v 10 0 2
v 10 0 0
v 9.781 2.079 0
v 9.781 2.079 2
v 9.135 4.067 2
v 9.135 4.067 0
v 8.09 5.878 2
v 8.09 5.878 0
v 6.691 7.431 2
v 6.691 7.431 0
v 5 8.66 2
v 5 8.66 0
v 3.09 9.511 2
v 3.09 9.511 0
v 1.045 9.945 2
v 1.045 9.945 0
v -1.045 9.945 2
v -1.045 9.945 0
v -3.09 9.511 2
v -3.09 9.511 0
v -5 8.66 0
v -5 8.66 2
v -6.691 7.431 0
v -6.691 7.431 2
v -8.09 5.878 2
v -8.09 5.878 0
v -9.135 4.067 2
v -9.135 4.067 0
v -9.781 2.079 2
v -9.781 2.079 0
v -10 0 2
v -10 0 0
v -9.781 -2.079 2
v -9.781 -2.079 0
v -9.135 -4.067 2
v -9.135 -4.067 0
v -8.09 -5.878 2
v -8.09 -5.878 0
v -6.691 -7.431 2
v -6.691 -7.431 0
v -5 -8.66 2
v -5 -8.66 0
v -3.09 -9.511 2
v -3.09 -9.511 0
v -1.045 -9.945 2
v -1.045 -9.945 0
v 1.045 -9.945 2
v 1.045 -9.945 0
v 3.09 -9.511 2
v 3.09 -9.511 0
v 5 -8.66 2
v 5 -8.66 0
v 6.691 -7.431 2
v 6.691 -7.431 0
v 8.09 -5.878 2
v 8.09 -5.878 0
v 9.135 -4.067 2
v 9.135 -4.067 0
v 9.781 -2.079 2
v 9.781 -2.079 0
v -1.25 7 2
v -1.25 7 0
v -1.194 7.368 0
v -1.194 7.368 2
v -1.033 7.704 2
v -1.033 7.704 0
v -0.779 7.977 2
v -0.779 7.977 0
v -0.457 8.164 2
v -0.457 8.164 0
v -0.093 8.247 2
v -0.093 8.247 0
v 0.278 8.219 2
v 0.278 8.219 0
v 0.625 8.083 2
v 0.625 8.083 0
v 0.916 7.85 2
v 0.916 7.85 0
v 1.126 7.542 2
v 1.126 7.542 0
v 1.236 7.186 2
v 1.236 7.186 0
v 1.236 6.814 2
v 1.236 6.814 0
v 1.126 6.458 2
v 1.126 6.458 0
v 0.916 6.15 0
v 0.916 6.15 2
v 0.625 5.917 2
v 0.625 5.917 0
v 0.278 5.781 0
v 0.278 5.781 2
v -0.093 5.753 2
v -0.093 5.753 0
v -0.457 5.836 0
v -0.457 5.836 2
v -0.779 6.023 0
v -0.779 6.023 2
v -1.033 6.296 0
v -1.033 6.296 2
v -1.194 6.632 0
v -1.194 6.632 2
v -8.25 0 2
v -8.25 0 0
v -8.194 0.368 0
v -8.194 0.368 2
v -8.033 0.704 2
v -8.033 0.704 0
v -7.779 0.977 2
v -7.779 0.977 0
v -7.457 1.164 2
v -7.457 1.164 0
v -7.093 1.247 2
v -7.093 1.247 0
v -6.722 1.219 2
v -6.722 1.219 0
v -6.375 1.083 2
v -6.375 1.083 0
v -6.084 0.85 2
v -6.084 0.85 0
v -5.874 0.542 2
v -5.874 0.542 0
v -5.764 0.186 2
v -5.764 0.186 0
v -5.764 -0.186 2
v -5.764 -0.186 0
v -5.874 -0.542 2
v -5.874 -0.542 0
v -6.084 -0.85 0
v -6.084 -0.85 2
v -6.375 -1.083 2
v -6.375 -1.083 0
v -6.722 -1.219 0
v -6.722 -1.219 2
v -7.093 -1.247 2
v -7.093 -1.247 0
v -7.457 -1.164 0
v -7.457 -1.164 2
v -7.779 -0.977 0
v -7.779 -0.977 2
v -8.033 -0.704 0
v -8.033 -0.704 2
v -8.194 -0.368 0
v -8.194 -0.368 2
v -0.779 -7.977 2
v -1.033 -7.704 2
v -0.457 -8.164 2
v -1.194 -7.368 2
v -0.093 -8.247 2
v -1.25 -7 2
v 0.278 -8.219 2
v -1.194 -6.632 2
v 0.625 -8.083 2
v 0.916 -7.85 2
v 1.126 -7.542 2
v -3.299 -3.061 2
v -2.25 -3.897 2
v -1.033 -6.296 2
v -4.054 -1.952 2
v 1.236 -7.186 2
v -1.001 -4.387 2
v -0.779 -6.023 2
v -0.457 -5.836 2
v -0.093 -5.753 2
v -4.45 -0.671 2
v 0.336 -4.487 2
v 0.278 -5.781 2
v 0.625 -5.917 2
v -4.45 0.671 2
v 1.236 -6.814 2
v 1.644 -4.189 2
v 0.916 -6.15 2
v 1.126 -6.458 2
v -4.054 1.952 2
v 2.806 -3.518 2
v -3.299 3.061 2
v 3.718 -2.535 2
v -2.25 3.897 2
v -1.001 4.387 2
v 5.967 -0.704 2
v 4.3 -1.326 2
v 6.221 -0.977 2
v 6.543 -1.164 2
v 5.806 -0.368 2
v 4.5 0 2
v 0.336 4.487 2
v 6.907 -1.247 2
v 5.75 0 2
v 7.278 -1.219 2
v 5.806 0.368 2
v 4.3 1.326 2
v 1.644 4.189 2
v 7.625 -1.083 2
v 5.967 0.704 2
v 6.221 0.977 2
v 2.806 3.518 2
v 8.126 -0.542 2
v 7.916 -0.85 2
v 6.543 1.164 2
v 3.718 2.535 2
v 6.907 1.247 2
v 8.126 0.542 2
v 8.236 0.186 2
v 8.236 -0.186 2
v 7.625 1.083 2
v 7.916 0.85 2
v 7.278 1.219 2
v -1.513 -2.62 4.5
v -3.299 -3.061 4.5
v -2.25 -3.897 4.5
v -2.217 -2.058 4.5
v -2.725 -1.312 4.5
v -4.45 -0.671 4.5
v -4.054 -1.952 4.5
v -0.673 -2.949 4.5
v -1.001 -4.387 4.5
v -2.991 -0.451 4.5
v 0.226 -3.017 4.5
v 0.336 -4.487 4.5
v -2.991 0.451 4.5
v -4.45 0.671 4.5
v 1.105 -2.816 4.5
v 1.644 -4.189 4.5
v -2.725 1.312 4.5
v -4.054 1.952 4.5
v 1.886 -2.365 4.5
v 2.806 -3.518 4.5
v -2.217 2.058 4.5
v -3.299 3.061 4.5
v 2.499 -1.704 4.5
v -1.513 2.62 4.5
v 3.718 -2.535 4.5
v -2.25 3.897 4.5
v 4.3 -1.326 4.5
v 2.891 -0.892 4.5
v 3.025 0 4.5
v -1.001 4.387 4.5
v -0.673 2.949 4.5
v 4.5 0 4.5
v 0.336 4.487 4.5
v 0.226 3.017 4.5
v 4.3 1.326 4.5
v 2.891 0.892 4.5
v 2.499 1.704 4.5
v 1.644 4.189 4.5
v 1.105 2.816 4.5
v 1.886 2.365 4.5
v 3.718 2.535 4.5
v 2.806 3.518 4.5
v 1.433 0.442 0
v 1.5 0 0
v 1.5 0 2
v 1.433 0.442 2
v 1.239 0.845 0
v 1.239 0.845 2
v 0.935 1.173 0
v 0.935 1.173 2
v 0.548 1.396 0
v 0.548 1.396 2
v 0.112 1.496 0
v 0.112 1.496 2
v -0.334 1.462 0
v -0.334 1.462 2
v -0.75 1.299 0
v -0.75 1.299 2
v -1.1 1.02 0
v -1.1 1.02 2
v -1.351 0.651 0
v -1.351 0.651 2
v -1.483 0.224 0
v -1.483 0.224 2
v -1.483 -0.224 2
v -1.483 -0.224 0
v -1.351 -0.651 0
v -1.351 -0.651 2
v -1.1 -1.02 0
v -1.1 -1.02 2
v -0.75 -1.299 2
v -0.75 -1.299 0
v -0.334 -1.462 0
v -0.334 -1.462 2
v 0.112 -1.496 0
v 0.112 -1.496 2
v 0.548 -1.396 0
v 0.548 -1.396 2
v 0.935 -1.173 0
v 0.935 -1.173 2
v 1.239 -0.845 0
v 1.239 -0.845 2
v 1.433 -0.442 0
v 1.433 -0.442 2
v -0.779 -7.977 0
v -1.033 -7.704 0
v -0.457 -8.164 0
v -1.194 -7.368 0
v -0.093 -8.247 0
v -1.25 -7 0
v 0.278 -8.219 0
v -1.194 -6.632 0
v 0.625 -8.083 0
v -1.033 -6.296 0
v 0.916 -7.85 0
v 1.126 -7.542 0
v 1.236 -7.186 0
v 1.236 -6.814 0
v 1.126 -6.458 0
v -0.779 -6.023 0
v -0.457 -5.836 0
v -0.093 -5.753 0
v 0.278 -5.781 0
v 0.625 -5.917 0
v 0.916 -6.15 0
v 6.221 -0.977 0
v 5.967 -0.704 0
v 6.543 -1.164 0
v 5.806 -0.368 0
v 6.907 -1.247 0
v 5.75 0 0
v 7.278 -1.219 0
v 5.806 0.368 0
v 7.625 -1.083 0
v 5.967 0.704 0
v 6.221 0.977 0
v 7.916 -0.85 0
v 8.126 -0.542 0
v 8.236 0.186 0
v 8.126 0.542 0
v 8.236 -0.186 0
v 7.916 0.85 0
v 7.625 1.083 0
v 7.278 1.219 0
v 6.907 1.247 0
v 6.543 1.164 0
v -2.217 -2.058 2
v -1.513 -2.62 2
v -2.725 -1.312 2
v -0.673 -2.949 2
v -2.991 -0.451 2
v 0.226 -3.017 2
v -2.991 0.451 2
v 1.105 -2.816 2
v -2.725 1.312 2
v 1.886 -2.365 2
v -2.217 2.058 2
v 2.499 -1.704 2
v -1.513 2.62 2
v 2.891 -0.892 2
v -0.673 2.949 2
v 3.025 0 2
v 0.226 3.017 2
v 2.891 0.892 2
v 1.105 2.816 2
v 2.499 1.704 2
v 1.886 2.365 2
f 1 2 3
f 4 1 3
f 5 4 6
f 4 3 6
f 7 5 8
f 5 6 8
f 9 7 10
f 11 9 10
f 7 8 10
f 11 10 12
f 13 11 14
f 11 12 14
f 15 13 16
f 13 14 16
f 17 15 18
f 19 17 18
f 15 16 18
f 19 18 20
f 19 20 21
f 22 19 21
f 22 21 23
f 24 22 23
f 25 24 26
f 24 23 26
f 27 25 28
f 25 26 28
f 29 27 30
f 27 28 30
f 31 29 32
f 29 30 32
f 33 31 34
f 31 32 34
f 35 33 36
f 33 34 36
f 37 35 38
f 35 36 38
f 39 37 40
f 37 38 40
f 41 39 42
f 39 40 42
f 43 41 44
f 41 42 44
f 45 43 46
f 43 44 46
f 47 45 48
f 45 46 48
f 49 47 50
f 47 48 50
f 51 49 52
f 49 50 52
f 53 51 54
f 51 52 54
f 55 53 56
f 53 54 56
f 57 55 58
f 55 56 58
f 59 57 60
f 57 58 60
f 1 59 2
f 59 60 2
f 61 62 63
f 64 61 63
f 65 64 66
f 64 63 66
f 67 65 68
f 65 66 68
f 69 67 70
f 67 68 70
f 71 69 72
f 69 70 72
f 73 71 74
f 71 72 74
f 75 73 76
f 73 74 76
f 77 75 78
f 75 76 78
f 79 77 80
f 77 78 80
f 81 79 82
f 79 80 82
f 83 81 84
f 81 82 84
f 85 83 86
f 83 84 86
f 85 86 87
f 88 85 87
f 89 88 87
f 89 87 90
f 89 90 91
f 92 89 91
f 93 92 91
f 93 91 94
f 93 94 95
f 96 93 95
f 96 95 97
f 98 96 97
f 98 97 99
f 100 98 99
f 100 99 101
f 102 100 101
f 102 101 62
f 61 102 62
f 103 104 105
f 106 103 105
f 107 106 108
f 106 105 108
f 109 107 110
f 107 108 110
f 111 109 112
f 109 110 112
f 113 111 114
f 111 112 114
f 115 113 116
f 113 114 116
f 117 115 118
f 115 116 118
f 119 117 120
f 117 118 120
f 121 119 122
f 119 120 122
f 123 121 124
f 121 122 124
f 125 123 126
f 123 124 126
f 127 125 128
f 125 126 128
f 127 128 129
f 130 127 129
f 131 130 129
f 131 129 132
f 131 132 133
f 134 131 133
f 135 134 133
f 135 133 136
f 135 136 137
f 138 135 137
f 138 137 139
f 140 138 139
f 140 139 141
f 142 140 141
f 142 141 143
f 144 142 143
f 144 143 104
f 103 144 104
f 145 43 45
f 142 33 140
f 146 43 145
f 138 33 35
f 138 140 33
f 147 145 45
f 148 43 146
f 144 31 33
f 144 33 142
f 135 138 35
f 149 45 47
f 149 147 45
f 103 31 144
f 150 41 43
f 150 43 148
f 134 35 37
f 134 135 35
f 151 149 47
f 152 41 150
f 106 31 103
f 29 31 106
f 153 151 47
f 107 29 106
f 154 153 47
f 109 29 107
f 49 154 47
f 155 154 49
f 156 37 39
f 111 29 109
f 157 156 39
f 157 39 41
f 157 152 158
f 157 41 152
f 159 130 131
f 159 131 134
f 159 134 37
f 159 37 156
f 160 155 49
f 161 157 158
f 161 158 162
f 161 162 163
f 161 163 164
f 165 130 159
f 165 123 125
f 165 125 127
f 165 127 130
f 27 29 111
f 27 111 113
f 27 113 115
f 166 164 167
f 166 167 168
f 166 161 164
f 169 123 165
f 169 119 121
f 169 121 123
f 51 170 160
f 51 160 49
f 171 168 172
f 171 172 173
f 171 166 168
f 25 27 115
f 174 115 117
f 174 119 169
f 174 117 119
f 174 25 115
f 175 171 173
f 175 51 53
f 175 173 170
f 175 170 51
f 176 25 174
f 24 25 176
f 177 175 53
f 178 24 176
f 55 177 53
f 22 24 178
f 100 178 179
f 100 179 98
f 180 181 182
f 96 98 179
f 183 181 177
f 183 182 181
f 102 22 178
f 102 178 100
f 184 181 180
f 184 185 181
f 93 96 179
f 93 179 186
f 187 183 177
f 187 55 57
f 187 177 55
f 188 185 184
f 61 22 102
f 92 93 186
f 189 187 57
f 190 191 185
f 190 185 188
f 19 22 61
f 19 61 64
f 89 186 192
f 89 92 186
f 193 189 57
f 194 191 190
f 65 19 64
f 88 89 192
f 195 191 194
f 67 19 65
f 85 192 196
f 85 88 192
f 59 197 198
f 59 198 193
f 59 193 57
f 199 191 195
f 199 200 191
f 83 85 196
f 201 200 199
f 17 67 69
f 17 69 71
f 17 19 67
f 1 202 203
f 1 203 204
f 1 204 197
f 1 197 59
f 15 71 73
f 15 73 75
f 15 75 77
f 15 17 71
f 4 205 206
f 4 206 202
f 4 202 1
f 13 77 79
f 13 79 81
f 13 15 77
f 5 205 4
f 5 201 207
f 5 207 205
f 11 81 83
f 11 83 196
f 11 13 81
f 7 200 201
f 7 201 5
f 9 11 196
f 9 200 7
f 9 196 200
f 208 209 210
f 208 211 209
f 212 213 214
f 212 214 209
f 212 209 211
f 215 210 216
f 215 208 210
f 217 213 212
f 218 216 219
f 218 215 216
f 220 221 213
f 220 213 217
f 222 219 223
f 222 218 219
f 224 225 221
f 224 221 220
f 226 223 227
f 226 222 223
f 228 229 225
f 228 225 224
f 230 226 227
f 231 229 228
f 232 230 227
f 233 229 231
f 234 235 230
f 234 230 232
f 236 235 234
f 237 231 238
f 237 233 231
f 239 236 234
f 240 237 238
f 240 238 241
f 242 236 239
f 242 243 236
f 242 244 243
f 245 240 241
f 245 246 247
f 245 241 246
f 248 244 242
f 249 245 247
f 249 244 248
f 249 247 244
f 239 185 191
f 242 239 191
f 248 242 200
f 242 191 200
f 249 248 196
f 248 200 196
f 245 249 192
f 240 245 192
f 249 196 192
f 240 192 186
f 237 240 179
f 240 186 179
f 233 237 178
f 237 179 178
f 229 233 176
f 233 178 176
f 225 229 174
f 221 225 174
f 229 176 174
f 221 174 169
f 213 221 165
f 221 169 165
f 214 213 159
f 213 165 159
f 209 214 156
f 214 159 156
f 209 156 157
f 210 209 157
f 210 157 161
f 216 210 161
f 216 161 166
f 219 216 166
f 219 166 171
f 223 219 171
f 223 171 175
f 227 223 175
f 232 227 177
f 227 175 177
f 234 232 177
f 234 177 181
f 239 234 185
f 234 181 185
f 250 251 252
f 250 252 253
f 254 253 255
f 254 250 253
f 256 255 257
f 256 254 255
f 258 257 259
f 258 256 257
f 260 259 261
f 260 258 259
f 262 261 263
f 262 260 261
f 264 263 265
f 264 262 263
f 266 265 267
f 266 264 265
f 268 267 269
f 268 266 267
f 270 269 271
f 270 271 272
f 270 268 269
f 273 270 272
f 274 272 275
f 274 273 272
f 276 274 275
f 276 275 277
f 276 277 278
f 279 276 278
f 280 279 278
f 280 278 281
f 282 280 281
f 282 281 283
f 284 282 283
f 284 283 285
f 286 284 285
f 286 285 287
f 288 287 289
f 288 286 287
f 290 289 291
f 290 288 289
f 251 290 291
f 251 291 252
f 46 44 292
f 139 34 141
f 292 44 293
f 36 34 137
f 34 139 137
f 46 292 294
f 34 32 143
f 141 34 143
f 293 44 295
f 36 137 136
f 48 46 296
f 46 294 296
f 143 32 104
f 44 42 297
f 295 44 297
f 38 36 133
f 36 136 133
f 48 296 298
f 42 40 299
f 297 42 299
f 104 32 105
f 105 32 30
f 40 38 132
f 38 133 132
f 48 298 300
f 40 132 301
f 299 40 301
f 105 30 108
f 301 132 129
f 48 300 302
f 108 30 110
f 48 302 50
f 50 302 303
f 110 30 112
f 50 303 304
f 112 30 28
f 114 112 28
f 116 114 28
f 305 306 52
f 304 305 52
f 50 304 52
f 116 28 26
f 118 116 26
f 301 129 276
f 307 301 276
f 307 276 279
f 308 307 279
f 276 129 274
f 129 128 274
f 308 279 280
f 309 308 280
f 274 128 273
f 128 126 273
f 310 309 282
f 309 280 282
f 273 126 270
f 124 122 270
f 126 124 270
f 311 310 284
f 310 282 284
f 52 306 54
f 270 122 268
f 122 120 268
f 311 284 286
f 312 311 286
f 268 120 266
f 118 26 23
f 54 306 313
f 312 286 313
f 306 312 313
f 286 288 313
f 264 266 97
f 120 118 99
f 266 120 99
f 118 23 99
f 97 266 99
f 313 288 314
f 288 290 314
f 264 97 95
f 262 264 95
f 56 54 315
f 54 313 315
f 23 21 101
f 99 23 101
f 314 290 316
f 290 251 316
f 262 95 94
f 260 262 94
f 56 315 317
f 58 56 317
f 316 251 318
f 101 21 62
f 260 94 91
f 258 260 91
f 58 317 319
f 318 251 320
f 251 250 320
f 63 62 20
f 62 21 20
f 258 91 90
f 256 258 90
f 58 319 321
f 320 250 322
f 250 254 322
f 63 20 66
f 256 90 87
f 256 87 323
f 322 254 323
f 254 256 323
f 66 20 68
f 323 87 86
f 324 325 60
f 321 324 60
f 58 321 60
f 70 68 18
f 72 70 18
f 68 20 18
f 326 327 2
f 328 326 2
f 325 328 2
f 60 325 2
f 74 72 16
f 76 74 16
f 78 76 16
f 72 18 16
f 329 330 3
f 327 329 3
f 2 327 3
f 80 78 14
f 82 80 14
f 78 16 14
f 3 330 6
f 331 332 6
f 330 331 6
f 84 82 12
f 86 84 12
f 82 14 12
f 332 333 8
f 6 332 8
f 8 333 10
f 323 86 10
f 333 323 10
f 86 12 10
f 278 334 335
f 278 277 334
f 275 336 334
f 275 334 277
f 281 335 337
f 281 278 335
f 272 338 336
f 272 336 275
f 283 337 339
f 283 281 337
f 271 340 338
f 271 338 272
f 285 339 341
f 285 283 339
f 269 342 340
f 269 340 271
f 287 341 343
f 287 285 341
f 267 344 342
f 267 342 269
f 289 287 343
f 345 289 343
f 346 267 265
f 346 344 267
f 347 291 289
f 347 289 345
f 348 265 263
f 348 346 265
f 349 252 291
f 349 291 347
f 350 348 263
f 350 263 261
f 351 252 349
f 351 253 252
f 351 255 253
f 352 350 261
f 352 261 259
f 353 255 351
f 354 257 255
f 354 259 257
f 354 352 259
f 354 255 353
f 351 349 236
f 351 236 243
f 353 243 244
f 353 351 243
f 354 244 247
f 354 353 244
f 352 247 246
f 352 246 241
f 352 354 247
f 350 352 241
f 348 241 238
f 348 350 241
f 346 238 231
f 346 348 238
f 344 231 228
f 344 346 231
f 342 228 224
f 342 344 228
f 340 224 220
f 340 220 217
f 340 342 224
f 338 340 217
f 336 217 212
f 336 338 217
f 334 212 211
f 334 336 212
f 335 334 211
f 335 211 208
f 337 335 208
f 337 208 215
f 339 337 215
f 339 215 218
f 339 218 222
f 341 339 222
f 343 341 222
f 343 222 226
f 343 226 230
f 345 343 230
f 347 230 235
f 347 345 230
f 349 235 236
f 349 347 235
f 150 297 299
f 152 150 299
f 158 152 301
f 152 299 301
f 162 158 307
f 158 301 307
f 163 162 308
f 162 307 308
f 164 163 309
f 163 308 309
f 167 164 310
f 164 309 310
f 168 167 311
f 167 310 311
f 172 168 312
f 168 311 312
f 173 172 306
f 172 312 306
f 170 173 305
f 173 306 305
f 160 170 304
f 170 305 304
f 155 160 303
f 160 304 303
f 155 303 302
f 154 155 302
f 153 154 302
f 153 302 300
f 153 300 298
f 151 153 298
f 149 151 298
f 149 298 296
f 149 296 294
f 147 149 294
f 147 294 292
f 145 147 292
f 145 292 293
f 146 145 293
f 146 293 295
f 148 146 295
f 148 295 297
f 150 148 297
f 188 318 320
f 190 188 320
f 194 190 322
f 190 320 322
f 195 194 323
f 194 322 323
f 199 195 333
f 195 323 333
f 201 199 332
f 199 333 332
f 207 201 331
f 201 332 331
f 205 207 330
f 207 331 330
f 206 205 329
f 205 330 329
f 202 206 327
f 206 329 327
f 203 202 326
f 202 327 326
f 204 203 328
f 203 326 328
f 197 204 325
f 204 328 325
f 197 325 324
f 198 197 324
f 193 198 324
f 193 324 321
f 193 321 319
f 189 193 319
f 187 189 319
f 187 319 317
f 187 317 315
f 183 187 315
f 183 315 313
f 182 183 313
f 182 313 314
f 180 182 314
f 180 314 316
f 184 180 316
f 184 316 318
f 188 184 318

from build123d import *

# Parameters (mm, degrees)
SKETCH1_R             = 10
SKETCH1_R_2           = 0.5
BOSS_EXTRUDE1_DEPTH   = 2
M3X0_5_TAPPED_HOLE2_D = 2.5
M3X0_5_TAPPED_HOLE3_D = 2.5
M3X0_5_TAPPED_HOLE4_D = 2.5
M3X0_5_TAPPED_HOLE5_D = 2.5
SKETCH11_R            = 4.5
SKETCH11_R_2          = 3.025
BOSS_EXTRUDE2_DEPTH   = 2.5


with BuildPart() as part:
    # Sketch1 → Boss-Extrude1 (new body)
    with BuildSketch(Plane.XY):
        Circle(SKETCH1_R)
        with BuildLine():
            ThreePointArc((0.5, -7), (-0.353553391, -7.353553391), (0, -6.5))
            ThreePointArc((0, -6.5), (0.353553391, -6.646446609), (0.5, -7))
        make_face(mode=Mode.SUBTRACT)
        with Locations((-7, 0)):
            Circle(SKETCH1_R_2, mode=Mode.SUBTRACT)
        with BuildLine():
            ThreePointArc((1.5, 0), (1.060660172, -1.060660172), (0, -1.5))
            ThreePointArc((0, -1.5), (-1.060660172, -1.060660172), (-1.5, 0))
            ThreePointArc((-1.5, 0), (-1.060660172, 1.060660172), (0, 1.5))
            ThreePointArc((0, 1.5), (1.060660172, 1.060660172), (1.5, 0))
        make_face(mode=Mode.SUBTRACT)
        with BuildLine():
            ThreePointArc((7.5, 0), (7, -0.5), (6.5, 0))
            ThreePointArc((6.5, 0), (7, 0.5), (7.5, 0))
        make_face(mode=Mode.SUBTRACT)
        with BuildLine():
            ThreePointArc((0.5, 7), (0.353553391, 6.646446609), (0, 6.5))
            ThreePointArc((0, 6.5), (-0.353553391, 7.353553391), (0.5, 7))
        make_face(mode=Mode.SUBTRACT)
    extrude(amount=BOSS_EXTRUDE1_DEPTH)

    # M3x0.5 Tapped Hole2 (through all)
    with Locations(Plane(origin=(0, 7, 2), x_dir=(1, 0, 0), z_dir=(0, 0, 1))):
        with Locations((0, 0)):
            Hole(M3X0_5_TAPPED_HOLE2_D / 2)

    # M3x0.5 Tapped Hole3 (through all)
    with Locations(Plane.XY.offset(2)):
        with Locations((-7, 0)):
            Hole(M3X0_5_TAPPED_HOLE3_D / 2)

    # M3x0.5 Tapped Hole4 (through all)
    with Locations(Plane.XY.offset(2)):
        with Locations((0, -7)):
            Hole(M3X0_5_TAPPED_HOLE4_D / 2)

    # M3x0.5 Tapped Hole5 (through all)
    with Locations(Plane.XY.offset(2)):
        with Locations((7, 0)):
            Hole(M3X0_5_TAPPED_HOLE5_D / 2)

    # Sketch11 → Boss-Extrude2 (add)
    with BuildSketch(Plane.XY.offset(2)):
        Circle(SKETCH11_R)
        Circle(SKETCH11_R_2, mode=Mode.SUBTRACT)
    extrude(amount=BOSS_EXTRUDE2_DEPTH)


solid = part.part
